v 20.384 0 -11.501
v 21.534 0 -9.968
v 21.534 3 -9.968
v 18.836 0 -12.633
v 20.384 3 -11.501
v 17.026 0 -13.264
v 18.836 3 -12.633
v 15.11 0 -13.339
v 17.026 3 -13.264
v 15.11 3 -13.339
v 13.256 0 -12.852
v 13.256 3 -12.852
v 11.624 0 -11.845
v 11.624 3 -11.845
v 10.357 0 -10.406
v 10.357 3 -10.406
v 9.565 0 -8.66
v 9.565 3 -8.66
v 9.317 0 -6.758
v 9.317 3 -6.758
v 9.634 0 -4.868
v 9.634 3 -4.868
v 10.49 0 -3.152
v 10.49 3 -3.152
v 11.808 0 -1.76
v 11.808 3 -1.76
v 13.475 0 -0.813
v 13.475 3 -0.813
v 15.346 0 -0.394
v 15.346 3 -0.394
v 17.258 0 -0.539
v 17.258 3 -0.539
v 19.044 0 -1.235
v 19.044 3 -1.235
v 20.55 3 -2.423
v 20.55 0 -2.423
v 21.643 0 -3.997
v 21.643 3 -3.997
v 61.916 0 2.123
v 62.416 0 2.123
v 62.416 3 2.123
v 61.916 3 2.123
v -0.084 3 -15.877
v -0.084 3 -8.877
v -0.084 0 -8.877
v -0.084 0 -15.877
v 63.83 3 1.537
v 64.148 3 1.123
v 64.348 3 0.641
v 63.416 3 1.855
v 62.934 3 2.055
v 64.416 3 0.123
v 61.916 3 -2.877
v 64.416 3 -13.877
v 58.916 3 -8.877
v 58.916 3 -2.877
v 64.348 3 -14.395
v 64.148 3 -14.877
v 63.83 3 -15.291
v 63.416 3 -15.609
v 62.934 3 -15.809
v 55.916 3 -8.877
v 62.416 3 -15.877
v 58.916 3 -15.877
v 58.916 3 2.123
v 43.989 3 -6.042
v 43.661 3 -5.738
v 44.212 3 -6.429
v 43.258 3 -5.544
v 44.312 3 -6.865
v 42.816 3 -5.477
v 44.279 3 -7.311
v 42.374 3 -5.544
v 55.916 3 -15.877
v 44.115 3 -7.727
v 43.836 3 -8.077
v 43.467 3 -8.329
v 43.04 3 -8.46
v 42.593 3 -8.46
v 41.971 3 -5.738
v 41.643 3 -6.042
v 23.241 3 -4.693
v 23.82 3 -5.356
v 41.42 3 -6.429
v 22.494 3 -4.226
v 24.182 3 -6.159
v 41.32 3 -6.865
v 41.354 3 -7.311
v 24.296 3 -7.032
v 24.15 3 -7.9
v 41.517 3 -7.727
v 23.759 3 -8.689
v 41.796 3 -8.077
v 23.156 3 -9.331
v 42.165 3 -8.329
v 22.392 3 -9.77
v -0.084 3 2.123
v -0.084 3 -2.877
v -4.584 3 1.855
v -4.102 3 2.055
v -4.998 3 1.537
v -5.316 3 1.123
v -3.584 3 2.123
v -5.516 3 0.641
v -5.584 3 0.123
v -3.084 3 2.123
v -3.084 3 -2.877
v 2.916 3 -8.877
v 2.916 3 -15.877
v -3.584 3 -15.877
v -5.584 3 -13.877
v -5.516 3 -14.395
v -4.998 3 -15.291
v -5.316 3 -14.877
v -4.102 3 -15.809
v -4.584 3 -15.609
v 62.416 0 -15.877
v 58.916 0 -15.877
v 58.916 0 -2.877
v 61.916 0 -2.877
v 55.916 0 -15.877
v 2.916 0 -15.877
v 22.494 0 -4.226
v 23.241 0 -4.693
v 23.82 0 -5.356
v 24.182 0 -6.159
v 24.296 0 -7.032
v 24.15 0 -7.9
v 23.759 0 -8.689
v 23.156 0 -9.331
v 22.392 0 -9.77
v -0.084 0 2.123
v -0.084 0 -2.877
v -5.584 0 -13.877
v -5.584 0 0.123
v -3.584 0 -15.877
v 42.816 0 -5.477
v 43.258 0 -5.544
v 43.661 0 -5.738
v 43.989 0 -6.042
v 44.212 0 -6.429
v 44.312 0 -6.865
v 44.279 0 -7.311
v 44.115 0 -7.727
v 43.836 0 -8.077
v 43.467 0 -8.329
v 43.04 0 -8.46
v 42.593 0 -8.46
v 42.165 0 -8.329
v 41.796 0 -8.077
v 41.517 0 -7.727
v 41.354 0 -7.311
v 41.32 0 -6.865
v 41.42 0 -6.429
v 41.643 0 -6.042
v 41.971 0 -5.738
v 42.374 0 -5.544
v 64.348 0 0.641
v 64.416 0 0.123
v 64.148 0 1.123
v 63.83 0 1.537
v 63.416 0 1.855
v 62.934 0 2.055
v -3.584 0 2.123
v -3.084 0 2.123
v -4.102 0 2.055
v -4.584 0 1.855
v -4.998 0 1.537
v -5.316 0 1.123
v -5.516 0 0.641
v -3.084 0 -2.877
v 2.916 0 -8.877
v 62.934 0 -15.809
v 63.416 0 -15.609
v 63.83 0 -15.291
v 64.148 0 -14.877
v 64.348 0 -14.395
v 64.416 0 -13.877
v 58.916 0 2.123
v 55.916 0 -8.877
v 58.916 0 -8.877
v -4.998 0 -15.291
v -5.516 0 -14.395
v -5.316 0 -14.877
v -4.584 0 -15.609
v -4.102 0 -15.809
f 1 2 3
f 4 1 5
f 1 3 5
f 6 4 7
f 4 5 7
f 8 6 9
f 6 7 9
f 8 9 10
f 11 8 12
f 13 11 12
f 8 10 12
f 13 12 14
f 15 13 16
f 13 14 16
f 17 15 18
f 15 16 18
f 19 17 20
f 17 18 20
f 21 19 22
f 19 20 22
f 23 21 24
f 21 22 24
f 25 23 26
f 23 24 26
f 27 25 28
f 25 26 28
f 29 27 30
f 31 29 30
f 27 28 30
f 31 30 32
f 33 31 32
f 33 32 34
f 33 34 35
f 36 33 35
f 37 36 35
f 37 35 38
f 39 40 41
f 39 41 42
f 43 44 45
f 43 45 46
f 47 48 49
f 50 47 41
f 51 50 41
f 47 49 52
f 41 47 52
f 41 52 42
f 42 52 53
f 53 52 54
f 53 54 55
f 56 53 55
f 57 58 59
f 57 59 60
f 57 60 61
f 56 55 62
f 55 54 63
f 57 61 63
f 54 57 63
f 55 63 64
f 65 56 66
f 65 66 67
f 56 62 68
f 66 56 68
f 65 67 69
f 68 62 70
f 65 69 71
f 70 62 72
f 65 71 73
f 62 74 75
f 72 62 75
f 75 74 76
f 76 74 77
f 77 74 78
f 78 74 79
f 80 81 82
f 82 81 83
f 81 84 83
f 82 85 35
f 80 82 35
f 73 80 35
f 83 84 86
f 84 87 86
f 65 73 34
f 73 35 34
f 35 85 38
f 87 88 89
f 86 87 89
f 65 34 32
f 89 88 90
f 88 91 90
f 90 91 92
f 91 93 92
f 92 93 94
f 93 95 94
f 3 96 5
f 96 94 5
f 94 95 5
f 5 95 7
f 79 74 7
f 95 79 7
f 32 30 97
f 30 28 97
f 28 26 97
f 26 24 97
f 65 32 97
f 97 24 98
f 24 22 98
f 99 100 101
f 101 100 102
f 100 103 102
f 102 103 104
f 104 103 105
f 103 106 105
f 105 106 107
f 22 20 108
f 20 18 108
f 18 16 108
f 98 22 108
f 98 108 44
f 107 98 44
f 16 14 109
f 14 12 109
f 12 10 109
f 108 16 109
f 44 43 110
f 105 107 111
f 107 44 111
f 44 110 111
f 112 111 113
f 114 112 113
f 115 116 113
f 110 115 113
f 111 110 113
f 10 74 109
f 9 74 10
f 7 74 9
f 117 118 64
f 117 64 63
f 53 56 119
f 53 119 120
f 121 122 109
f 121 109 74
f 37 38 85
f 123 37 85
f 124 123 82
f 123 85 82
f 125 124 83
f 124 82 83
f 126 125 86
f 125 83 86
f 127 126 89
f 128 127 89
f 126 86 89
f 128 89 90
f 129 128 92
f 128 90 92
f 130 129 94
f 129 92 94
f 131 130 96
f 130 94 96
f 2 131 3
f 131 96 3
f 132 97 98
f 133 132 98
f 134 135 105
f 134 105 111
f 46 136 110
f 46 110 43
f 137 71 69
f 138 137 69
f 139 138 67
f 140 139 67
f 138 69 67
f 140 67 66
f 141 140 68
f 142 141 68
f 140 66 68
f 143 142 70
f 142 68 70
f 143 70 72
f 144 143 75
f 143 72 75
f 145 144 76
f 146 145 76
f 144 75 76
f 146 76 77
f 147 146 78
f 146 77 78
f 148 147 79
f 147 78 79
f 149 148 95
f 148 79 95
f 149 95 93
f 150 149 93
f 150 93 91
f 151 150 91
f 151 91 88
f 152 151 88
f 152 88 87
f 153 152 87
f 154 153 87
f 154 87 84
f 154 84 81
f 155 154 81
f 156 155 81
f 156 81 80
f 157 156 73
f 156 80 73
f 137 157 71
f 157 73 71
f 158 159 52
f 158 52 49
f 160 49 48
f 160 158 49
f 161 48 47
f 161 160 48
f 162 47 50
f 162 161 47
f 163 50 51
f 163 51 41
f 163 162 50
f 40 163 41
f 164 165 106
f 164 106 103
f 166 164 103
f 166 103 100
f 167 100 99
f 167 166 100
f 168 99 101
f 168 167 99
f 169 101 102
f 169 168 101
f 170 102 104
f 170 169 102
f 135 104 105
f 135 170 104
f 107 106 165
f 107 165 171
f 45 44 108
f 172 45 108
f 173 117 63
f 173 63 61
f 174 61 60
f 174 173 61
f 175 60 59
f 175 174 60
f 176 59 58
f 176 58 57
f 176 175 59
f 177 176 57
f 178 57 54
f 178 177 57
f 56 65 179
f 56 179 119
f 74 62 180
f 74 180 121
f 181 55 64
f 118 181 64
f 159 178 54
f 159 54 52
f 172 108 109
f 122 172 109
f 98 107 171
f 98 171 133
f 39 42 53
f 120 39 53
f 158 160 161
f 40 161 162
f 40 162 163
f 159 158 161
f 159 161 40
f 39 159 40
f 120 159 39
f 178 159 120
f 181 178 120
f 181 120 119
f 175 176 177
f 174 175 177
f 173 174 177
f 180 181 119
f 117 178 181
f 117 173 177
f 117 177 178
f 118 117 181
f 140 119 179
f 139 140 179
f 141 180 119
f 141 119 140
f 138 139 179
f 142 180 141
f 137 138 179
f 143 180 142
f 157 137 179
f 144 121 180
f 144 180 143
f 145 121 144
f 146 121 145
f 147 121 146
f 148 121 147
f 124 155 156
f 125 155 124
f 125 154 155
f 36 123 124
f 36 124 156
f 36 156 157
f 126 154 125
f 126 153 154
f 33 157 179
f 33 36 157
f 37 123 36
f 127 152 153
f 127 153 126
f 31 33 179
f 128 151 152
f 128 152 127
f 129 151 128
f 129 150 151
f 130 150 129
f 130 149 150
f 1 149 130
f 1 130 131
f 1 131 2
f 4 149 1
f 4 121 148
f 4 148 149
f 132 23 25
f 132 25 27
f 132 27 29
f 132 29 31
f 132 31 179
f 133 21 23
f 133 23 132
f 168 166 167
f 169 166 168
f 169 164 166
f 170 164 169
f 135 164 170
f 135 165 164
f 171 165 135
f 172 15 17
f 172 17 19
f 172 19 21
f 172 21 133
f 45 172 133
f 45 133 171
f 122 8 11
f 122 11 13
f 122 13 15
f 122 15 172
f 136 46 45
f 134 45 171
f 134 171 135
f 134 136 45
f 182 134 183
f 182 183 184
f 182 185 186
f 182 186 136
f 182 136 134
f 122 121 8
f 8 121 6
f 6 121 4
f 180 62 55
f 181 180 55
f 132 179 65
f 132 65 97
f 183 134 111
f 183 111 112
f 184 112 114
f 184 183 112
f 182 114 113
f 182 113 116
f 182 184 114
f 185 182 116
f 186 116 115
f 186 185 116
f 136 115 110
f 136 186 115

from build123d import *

# Parameters (mm, degrees)
BOSS_EXTRUDE1_DEPTH = 3
SKETCH4_R           = 6.5
CUT_EXTRUDE1_DEPTH  = 3
SKETCH5_R           = 3
SKETCH5_R_2         = 1.5
CUT_EXTRUDE2_DEPTH  = 3
SKETCH6_W           = 3
SKETCH6_H           = 7
CUT_EXTRUDE3_DEPTH  = 3
SKETCH7_W           = 3
SKETCH7_H           = 5
CUT_EXTRUDE4_DEPTH  = 3


with BuildPart() as part:
    # Sketch2 → Boss-Extrude1 (new body)
    with BuildSketch(Plane(origin=(0, 0, 0), x_dir=(1, 0, 0), z_dir=(0, 1, 0))):
        with BuildLine():
            Line((-3.583885407, 15.877073113), (62.416114593, 15.877073113))
            ThreePointArc((62.416114593, 15.877073113), (63.830328155, 15.291286675), (64.416114593, 13.877073113))
            Line((64.416114593, 13.877073113), (64.416114593, -0.122926887))
            ThreePointArc((64.416114593, -0.122926887), (63.830328155, -1.53714045), (62.416114593, -2.122926887))
            Line((62.416114593, -2.122926887), (-3.583885407, -2.122926887))
            ThreePointArc((-3.583885407, -2.122926887), (-4.99809897, -1.53714045), (-5.583885407, -0.122926887))
            Line((-5.583885407, -0.122926887), (-5.583885407, 13.877073113))
            ThreePointArc((-5.583885407, 13.877073113), (-4.99809897, 15.291286675), (-3.583885407, 15.877073113))
        make_face()
    extrude(amount=BOSS_EXTRUDE1_DEPTH)

    # Sketch4 → Cut-Extrude1 (cut)
    with BuildSketch(Plane(origin=(0, 3, 0), x_dir=(1, 0, 0), z_dir=(0, 1, 0))):
        with Locations(Location((15.816114593, 6.877073113, 0), (0, 0, 270))):
            Circle(SKETCH4_R)
    extrude(amount=-CUT_EXTRUDE1_DEPTH, mode=Mode.SUBTRACT)

    # Sketch5 → Cut-Extrude2 (cut)
    with BuildSketch(Plane(origin=(0, 3, 0), x_dir=(1, 0, 0), z_dir=(0, 1, 0))):
        with Locations((21.296114593, 6.977073113)):
            Circle(SKETCH5_R)
        with Locations(Location((42.816114593, 6.977073113, 0), (0, 0, 270))):
            Circle(SKETCH5_R_2)
    extrude(amount=-CUT_EXTRUDE2_DEPTH, mode=Mode.SUBTRACT)

    # Sketch6 → Cut-Extrude3 (cut)
    with BuildSketch(Plane(origin=(0, 3, 0), x_dir=(1, 0, 0), z_dir=(0, 1, 0))):
        with Locations((1.416114593, 12.377073113)):
            Rectangle(SKETCH6_W, SKETCH6_H)
        with Locations((57.416114593, 12.377073113)):
            Rectangle(SKETCH6_W, SKETCH6_H)
    extrude(amount=-CUT_EXTRUDE3_DEPTH, mode=Mode.SUBTRACT)

    # Sketch7 → Cut-Extrude4 (cut)
    with BuildSketch(Plane(origin=(0, 3, 0), x_dir=(1, 0, 0), z_dir=(0, 1, 0))):
        with Locations((60.416114593, 0.377073113)):
            Rectangle(SKETCH7_W, SKETCH7_H)
        with Locations((-1.583885407, 0.377073113)):
            Rectangle(SKETCH7_W, SKETCH7_H)
    extrude(amount=-CUT_EXTRUDE4_DEPTH, mode=Mode.SUBTRACT)


solid = part.part
